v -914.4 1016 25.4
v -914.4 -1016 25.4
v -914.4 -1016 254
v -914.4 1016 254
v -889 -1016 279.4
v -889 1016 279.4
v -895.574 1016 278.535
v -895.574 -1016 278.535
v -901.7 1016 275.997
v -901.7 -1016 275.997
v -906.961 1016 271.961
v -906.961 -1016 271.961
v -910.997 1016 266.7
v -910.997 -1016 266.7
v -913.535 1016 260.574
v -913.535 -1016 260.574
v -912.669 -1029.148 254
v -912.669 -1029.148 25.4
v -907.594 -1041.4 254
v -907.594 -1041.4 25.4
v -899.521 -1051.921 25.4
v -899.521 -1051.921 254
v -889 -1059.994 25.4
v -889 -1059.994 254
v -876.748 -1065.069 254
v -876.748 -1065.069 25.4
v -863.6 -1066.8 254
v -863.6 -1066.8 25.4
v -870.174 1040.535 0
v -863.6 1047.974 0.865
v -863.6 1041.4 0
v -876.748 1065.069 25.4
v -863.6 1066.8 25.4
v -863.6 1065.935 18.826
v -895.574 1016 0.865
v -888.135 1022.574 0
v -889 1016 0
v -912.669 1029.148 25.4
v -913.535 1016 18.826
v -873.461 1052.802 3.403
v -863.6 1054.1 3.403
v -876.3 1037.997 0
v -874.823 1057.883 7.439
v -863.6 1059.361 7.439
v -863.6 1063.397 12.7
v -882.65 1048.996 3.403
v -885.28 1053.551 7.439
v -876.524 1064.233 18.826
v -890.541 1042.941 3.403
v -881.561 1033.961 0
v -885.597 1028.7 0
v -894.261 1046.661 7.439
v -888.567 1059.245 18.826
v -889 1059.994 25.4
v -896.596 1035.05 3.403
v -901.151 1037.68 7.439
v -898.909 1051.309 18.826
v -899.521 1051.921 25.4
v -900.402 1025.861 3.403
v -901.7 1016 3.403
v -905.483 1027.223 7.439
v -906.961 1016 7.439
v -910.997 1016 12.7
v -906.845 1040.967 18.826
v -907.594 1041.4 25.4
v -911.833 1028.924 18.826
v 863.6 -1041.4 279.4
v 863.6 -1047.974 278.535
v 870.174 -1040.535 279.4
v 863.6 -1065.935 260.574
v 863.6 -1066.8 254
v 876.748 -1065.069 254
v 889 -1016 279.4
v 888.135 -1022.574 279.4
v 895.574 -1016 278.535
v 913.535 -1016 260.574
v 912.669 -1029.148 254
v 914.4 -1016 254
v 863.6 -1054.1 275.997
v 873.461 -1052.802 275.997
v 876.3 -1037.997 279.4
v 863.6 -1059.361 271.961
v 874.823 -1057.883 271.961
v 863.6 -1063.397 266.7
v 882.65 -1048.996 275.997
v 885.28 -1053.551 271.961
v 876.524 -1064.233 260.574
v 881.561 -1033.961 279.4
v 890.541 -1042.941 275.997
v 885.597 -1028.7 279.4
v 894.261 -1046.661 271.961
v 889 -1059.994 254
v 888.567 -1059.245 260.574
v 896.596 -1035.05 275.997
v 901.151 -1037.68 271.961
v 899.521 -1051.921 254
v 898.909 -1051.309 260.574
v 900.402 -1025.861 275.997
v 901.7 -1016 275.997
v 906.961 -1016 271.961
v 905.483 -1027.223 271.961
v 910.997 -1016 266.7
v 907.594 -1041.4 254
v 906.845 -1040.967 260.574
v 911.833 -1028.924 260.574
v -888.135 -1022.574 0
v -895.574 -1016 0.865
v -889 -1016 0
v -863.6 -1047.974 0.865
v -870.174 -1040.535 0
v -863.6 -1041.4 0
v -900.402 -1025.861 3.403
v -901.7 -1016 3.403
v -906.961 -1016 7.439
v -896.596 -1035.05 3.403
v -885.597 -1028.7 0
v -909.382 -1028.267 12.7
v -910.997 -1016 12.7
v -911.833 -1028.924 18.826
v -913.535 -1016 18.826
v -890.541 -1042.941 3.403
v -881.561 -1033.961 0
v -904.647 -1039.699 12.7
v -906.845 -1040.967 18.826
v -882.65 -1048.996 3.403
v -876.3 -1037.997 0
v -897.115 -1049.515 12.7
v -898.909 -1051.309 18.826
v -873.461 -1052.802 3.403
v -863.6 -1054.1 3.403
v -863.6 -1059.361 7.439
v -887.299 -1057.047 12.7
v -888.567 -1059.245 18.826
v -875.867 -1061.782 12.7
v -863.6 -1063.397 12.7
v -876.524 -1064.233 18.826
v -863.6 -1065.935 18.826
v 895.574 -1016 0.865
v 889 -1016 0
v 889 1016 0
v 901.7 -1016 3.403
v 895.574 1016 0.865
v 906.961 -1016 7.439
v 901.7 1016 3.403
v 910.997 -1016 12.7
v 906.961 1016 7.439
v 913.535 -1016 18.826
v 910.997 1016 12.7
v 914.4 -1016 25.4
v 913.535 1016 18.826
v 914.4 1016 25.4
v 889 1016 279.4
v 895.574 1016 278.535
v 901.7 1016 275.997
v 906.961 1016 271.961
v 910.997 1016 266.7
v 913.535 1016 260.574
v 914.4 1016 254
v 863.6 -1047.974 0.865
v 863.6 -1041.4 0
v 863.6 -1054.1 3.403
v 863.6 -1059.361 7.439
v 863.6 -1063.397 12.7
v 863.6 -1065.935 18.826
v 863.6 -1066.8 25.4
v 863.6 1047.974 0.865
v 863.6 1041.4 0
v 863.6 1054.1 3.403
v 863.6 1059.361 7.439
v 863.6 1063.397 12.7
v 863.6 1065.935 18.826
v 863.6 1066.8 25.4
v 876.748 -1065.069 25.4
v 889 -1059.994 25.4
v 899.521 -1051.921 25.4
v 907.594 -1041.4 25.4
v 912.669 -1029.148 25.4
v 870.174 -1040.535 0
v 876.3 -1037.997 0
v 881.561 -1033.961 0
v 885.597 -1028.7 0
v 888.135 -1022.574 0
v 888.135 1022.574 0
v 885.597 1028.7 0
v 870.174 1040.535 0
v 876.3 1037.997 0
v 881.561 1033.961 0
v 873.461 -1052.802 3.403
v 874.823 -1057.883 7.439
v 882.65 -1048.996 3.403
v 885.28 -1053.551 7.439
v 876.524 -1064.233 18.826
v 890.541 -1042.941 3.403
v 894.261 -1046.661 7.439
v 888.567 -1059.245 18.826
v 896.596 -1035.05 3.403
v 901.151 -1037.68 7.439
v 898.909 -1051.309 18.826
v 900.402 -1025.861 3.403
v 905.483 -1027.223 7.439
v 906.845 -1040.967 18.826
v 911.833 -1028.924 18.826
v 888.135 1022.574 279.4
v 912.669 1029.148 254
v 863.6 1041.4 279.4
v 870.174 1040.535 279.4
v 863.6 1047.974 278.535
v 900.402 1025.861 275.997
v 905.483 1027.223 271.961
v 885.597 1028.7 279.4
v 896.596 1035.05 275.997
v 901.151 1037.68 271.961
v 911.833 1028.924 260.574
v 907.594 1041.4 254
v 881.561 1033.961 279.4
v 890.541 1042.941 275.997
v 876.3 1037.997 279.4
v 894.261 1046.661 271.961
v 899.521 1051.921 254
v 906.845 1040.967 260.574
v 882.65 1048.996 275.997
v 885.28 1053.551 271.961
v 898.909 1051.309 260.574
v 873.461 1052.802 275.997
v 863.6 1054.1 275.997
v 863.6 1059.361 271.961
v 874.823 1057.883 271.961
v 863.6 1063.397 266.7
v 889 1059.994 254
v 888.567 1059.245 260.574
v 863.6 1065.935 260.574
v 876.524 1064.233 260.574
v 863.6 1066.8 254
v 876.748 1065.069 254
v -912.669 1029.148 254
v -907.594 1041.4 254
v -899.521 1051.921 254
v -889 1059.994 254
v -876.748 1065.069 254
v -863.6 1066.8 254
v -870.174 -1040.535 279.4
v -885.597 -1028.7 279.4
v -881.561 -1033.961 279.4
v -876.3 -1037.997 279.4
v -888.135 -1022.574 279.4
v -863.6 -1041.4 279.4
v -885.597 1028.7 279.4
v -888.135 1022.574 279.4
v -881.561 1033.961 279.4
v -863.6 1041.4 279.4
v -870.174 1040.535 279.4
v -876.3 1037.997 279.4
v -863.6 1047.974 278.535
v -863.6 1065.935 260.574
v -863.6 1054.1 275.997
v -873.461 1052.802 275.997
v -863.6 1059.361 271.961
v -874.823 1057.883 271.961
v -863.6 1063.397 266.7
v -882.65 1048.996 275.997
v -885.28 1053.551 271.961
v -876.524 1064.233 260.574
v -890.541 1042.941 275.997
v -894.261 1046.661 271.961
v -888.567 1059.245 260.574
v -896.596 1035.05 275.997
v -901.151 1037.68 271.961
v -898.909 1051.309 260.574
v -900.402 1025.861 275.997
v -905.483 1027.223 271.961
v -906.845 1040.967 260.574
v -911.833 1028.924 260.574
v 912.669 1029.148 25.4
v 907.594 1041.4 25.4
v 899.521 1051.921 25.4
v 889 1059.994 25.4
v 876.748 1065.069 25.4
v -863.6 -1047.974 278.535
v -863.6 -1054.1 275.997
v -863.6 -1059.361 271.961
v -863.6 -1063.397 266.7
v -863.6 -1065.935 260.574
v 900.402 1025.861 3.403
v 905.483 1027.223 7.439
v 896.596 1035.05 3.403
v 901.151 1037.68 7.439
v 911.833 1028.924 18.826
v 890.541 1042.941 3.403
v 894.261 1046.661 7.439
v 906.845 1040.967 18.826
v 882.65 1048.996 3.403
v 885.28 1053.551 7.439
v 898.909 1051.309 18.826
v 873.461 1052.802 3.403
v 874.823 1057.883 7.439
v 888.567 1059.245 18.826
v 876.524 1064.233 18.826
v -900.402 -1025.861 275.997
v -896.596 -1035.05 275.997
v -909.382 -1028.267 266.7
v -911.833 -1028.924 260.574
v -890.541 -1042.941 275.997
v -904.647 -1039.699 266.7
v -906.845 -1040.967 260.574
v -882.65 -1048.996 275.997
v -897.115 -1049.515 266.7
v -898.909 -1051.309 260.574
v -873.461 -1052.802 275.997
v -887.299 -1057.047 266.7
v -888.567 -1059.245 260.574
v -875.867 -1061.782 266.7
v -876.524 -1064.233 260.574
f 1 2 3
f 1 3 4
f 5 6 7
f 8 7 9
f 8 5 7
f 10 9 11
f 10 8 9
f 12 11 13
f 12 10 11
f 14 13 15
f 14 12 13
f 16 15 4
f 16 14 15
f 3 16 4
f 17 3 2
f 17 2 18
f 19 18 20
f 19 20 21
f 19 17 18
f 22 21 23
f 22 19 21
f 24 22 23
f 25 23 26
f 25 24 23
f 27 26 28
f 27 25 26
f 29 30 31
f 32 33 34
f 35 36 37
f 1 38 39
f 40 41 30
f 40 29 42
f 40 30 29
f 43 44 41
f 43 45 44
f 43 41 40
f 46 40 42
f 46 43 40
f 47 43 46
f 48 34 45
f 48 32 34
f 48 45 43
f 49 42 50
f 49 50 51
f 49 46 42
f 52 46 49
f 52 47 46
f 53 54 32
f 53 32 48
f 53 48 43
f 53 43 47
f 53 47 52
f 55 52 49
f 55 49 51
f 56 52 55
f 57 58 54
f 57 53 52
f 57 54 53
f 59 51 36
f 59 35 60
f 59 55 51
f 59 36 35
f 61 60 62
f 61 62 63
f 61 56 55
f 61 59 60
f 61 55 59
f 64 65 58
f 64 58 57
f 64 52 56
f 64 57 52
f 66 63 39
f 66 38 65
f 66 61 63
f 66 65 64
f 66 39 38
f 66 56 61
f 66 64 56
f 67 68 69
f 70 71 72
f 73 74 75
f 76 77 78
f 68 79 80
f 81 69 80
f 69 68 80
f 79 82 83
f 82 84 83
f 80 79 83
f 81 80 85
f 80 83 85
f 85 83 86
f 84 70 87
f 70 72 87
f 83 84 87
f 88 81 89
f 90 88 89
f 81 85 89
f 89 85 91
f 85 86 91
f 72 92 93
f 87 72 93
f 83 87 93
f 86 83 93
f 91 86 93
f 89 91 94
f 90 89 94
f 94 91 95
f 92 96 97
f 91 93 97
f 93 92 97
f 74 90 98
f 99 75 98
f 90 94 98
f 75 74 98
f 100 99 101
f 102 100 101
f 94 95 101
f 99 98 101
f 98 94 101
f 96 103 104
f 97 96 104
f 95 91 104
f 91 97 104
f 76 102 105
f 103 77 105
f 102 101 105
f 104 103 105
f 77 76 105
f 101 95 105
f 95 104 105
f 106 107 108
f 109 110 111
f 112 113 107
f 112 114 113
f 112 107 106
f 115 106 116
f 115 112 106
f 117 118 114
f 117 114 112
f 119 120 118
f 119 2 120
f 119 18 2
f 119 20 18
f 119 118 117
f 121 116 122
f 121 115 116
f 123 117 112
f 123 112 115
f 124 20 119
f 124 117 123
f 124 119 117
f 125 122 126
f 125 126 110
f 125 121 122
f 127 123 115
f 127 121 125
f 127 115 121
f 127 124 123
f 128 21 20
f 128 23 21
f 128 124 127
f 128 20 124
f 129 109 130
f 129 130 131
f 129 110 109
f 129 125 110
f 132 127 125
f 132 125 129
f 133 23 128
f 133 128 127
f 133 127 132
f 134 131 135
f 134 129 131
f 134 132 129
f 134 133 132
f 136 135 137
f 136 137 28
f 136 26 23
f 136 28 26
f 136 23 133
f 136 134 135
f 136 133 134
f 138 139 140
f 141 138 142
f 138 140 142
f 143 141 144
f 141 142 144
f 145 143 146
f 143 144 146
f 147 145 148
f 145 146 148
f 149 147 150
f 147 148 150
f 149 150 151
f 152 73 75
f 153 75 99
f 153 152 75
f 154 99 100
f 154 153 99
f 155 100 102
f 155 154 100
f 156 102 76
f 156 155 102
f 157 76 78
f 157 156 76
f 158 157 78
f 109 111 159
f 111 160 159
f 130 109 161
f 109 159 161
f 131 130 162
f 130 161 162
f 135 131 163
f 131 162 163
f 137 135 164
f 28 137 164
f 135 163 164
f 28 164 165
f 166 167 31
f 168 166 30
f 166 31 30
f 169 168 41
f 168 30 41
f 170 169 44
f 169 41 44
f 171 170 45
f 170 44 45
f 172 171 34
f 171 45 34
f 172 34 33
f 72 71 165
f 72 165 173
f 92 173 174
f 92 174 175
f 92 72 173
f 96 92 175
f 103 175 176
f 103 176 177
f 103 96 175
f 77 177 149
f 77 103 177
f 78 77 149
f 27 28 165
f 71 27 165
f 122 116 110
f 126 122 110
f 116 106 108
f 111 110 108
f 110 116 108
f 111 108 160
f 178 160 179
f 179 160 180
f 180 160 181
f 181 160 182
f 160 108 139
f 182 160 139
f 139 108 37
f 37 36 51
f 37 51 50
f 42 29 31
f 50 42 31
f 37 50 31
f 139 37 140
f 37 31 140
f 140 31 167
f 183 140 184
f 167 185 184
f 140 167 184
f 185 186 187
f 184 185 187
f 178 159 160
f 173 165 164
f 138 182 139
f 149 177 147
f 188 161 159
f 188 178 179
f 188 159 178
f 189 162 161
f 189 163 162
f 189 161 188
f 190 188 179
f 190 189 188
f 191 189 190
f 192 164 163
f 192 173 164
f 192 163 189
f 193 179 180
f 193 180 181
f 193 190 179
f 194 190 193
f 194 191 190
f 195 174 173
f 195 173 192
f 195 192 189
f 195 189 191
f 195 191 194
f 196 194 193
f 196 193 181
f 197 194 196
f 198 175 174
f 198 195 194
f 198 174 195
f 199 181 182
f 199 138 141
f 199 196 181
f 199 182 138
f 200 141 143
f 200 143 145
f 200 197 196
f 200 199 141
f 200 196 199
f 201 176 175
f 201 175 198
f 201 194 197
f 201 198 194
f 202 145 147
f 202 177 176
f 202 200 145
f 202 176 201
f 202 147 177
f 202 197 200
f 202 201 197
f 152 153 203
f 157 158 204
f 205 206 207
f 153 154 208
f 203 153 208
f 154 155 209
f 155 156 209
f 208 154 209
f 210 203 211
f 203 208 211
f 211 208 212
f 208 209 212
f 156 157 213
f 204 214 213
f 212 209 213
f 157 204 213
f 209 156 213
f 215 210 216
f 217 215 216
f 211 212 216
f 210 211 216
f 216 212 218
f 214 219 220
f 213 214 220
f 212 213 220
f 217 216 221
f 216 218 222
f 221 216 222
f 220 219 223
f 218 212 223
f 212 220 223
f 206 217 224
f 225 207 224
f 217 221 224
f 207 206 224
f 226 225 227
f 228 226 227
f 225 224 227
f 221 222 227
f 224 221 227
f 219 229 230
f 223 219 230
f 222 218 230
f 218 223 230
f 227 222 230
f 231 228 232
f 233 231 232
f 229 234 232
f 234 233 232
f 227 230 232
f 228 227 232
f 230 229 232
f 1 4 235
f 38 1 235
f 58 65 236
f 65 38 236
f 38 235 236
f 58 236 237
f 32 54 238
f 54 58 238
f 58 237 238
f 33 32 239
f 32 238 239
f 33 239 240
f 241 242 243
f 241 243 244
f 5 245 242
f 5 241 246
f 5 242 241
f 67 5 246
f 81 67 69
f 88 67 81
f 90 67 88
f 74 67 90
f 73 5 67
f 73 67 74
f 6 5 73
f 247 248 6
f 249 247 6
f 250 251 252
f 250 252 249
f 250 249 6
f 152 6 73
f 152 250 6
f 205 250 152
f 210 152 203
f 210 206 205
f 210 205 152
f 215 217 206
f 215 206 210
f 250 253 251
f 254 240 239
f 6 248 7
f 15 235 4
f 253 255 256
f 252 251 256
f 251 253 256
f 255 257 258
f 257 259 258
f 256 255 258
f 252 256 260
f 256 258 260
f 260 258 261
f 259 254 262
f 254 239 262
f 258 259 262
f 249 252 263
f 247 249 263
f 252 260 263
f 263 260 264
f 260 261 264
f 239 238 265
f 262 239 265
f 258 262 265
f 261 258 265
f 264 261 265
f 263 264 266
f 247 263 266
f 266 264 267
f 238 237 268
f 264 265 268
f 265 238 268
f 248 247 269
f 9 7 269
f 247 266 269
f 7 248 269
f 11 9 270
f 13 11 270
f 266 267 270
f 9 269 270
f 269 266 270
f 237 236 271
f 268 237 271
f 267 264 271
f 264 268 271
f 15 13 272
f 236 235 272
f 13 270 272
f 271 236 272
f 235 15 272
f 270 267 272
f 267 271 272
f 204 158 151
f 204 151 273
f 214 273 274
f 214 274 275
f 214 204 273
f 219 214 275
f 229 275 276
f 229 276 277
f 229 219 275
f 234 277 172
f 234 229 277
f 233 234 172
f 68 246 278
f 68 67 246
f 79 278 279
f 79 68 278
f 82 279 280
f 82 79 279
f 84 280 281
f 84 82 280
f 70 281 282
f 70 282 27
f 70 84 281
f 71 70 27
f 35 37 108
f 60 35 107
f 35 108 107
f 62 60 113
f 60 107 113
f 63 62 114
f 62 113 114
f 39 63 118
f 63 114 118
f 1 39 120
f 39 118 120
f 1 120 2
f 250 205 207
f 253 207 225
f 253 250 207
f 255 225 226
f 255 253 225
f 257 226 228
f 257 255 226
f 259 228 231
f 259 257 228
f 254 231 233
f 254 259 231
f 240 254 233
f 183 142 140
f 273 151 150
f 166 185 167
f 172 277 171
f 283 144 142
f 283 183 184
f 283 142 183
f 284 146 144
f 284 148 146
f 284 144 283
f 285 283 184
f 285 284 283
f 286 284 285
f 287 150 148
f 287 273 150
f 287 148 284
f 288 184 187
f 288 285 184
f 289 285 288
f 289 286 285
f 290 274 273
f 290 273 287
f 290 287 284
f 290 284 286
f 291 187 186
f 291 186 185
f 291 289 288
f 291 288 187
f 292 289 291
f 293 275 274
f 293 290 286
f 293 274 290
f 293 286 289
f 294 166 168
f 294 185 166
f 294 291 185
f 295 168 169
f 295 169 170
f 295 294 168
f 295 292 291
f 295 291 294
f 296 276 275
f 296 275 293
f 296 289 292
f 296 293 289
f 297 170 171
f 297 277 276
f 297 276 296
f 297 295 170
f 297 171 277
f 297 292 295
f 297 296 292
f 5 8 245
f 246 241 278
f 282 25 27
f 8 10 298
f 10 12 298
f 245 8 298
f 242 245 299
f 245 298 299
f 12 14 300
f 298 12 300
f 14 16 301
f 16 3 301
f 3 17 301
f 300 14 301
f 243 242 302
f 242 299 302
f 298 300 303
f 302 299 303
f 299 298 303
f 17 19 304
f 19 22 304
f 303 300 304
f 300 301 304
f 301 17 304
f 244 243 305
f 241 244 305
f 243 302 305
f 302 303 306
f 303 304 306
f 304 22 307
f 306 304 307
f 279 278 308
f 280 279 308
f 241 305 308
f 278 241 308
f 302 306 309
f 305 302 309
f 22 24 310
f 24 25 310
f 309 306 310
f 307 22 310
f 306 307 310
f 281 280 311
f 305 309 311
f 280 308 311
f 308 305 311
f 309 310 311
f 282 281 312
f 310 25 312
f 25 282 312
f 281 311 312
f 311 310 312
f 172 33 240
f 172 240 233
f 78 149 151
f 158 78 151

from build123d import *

# Parameters (mm, degrees)
F0_W     = 1828.8
F0_H     = 2133.6
F1_DEPTH = 279.4
F2_R     = 50.8
F3_R     = 25.4


with BuildPart() as f1:
    # F0 (on Top) → F1 (new body)
    with BuildSketch(Plane.XY):
        Rectangle(F0_W, F0_H)
    extrude(amount=F1_DEPTH)

    # F2
    f2_edges = [f1.edges().sort_by_distance(p)[0] for p in [
        (-914.4, -1066.8, 139.7),
        (-914.4, 1066.8, 139.7),
        (914.4, -1066.8, 139.7),
        (914.4, 1066.8, 139.7),
    ]]
    fillet(f2_edges, radius=F2_R)

    # F3
    f3_edges = [f1.edges().sort_by_distance(p)[0] for p in [
        (0, -1066.8, 279.4),
        (899.521024, -1051.921024, 279.4),
        (914.4, 0, 279.4),
        (0, -1066.8, 0),
    ]]
    fillet(f3_edges, radius=F3_R)


solid = f1.part
